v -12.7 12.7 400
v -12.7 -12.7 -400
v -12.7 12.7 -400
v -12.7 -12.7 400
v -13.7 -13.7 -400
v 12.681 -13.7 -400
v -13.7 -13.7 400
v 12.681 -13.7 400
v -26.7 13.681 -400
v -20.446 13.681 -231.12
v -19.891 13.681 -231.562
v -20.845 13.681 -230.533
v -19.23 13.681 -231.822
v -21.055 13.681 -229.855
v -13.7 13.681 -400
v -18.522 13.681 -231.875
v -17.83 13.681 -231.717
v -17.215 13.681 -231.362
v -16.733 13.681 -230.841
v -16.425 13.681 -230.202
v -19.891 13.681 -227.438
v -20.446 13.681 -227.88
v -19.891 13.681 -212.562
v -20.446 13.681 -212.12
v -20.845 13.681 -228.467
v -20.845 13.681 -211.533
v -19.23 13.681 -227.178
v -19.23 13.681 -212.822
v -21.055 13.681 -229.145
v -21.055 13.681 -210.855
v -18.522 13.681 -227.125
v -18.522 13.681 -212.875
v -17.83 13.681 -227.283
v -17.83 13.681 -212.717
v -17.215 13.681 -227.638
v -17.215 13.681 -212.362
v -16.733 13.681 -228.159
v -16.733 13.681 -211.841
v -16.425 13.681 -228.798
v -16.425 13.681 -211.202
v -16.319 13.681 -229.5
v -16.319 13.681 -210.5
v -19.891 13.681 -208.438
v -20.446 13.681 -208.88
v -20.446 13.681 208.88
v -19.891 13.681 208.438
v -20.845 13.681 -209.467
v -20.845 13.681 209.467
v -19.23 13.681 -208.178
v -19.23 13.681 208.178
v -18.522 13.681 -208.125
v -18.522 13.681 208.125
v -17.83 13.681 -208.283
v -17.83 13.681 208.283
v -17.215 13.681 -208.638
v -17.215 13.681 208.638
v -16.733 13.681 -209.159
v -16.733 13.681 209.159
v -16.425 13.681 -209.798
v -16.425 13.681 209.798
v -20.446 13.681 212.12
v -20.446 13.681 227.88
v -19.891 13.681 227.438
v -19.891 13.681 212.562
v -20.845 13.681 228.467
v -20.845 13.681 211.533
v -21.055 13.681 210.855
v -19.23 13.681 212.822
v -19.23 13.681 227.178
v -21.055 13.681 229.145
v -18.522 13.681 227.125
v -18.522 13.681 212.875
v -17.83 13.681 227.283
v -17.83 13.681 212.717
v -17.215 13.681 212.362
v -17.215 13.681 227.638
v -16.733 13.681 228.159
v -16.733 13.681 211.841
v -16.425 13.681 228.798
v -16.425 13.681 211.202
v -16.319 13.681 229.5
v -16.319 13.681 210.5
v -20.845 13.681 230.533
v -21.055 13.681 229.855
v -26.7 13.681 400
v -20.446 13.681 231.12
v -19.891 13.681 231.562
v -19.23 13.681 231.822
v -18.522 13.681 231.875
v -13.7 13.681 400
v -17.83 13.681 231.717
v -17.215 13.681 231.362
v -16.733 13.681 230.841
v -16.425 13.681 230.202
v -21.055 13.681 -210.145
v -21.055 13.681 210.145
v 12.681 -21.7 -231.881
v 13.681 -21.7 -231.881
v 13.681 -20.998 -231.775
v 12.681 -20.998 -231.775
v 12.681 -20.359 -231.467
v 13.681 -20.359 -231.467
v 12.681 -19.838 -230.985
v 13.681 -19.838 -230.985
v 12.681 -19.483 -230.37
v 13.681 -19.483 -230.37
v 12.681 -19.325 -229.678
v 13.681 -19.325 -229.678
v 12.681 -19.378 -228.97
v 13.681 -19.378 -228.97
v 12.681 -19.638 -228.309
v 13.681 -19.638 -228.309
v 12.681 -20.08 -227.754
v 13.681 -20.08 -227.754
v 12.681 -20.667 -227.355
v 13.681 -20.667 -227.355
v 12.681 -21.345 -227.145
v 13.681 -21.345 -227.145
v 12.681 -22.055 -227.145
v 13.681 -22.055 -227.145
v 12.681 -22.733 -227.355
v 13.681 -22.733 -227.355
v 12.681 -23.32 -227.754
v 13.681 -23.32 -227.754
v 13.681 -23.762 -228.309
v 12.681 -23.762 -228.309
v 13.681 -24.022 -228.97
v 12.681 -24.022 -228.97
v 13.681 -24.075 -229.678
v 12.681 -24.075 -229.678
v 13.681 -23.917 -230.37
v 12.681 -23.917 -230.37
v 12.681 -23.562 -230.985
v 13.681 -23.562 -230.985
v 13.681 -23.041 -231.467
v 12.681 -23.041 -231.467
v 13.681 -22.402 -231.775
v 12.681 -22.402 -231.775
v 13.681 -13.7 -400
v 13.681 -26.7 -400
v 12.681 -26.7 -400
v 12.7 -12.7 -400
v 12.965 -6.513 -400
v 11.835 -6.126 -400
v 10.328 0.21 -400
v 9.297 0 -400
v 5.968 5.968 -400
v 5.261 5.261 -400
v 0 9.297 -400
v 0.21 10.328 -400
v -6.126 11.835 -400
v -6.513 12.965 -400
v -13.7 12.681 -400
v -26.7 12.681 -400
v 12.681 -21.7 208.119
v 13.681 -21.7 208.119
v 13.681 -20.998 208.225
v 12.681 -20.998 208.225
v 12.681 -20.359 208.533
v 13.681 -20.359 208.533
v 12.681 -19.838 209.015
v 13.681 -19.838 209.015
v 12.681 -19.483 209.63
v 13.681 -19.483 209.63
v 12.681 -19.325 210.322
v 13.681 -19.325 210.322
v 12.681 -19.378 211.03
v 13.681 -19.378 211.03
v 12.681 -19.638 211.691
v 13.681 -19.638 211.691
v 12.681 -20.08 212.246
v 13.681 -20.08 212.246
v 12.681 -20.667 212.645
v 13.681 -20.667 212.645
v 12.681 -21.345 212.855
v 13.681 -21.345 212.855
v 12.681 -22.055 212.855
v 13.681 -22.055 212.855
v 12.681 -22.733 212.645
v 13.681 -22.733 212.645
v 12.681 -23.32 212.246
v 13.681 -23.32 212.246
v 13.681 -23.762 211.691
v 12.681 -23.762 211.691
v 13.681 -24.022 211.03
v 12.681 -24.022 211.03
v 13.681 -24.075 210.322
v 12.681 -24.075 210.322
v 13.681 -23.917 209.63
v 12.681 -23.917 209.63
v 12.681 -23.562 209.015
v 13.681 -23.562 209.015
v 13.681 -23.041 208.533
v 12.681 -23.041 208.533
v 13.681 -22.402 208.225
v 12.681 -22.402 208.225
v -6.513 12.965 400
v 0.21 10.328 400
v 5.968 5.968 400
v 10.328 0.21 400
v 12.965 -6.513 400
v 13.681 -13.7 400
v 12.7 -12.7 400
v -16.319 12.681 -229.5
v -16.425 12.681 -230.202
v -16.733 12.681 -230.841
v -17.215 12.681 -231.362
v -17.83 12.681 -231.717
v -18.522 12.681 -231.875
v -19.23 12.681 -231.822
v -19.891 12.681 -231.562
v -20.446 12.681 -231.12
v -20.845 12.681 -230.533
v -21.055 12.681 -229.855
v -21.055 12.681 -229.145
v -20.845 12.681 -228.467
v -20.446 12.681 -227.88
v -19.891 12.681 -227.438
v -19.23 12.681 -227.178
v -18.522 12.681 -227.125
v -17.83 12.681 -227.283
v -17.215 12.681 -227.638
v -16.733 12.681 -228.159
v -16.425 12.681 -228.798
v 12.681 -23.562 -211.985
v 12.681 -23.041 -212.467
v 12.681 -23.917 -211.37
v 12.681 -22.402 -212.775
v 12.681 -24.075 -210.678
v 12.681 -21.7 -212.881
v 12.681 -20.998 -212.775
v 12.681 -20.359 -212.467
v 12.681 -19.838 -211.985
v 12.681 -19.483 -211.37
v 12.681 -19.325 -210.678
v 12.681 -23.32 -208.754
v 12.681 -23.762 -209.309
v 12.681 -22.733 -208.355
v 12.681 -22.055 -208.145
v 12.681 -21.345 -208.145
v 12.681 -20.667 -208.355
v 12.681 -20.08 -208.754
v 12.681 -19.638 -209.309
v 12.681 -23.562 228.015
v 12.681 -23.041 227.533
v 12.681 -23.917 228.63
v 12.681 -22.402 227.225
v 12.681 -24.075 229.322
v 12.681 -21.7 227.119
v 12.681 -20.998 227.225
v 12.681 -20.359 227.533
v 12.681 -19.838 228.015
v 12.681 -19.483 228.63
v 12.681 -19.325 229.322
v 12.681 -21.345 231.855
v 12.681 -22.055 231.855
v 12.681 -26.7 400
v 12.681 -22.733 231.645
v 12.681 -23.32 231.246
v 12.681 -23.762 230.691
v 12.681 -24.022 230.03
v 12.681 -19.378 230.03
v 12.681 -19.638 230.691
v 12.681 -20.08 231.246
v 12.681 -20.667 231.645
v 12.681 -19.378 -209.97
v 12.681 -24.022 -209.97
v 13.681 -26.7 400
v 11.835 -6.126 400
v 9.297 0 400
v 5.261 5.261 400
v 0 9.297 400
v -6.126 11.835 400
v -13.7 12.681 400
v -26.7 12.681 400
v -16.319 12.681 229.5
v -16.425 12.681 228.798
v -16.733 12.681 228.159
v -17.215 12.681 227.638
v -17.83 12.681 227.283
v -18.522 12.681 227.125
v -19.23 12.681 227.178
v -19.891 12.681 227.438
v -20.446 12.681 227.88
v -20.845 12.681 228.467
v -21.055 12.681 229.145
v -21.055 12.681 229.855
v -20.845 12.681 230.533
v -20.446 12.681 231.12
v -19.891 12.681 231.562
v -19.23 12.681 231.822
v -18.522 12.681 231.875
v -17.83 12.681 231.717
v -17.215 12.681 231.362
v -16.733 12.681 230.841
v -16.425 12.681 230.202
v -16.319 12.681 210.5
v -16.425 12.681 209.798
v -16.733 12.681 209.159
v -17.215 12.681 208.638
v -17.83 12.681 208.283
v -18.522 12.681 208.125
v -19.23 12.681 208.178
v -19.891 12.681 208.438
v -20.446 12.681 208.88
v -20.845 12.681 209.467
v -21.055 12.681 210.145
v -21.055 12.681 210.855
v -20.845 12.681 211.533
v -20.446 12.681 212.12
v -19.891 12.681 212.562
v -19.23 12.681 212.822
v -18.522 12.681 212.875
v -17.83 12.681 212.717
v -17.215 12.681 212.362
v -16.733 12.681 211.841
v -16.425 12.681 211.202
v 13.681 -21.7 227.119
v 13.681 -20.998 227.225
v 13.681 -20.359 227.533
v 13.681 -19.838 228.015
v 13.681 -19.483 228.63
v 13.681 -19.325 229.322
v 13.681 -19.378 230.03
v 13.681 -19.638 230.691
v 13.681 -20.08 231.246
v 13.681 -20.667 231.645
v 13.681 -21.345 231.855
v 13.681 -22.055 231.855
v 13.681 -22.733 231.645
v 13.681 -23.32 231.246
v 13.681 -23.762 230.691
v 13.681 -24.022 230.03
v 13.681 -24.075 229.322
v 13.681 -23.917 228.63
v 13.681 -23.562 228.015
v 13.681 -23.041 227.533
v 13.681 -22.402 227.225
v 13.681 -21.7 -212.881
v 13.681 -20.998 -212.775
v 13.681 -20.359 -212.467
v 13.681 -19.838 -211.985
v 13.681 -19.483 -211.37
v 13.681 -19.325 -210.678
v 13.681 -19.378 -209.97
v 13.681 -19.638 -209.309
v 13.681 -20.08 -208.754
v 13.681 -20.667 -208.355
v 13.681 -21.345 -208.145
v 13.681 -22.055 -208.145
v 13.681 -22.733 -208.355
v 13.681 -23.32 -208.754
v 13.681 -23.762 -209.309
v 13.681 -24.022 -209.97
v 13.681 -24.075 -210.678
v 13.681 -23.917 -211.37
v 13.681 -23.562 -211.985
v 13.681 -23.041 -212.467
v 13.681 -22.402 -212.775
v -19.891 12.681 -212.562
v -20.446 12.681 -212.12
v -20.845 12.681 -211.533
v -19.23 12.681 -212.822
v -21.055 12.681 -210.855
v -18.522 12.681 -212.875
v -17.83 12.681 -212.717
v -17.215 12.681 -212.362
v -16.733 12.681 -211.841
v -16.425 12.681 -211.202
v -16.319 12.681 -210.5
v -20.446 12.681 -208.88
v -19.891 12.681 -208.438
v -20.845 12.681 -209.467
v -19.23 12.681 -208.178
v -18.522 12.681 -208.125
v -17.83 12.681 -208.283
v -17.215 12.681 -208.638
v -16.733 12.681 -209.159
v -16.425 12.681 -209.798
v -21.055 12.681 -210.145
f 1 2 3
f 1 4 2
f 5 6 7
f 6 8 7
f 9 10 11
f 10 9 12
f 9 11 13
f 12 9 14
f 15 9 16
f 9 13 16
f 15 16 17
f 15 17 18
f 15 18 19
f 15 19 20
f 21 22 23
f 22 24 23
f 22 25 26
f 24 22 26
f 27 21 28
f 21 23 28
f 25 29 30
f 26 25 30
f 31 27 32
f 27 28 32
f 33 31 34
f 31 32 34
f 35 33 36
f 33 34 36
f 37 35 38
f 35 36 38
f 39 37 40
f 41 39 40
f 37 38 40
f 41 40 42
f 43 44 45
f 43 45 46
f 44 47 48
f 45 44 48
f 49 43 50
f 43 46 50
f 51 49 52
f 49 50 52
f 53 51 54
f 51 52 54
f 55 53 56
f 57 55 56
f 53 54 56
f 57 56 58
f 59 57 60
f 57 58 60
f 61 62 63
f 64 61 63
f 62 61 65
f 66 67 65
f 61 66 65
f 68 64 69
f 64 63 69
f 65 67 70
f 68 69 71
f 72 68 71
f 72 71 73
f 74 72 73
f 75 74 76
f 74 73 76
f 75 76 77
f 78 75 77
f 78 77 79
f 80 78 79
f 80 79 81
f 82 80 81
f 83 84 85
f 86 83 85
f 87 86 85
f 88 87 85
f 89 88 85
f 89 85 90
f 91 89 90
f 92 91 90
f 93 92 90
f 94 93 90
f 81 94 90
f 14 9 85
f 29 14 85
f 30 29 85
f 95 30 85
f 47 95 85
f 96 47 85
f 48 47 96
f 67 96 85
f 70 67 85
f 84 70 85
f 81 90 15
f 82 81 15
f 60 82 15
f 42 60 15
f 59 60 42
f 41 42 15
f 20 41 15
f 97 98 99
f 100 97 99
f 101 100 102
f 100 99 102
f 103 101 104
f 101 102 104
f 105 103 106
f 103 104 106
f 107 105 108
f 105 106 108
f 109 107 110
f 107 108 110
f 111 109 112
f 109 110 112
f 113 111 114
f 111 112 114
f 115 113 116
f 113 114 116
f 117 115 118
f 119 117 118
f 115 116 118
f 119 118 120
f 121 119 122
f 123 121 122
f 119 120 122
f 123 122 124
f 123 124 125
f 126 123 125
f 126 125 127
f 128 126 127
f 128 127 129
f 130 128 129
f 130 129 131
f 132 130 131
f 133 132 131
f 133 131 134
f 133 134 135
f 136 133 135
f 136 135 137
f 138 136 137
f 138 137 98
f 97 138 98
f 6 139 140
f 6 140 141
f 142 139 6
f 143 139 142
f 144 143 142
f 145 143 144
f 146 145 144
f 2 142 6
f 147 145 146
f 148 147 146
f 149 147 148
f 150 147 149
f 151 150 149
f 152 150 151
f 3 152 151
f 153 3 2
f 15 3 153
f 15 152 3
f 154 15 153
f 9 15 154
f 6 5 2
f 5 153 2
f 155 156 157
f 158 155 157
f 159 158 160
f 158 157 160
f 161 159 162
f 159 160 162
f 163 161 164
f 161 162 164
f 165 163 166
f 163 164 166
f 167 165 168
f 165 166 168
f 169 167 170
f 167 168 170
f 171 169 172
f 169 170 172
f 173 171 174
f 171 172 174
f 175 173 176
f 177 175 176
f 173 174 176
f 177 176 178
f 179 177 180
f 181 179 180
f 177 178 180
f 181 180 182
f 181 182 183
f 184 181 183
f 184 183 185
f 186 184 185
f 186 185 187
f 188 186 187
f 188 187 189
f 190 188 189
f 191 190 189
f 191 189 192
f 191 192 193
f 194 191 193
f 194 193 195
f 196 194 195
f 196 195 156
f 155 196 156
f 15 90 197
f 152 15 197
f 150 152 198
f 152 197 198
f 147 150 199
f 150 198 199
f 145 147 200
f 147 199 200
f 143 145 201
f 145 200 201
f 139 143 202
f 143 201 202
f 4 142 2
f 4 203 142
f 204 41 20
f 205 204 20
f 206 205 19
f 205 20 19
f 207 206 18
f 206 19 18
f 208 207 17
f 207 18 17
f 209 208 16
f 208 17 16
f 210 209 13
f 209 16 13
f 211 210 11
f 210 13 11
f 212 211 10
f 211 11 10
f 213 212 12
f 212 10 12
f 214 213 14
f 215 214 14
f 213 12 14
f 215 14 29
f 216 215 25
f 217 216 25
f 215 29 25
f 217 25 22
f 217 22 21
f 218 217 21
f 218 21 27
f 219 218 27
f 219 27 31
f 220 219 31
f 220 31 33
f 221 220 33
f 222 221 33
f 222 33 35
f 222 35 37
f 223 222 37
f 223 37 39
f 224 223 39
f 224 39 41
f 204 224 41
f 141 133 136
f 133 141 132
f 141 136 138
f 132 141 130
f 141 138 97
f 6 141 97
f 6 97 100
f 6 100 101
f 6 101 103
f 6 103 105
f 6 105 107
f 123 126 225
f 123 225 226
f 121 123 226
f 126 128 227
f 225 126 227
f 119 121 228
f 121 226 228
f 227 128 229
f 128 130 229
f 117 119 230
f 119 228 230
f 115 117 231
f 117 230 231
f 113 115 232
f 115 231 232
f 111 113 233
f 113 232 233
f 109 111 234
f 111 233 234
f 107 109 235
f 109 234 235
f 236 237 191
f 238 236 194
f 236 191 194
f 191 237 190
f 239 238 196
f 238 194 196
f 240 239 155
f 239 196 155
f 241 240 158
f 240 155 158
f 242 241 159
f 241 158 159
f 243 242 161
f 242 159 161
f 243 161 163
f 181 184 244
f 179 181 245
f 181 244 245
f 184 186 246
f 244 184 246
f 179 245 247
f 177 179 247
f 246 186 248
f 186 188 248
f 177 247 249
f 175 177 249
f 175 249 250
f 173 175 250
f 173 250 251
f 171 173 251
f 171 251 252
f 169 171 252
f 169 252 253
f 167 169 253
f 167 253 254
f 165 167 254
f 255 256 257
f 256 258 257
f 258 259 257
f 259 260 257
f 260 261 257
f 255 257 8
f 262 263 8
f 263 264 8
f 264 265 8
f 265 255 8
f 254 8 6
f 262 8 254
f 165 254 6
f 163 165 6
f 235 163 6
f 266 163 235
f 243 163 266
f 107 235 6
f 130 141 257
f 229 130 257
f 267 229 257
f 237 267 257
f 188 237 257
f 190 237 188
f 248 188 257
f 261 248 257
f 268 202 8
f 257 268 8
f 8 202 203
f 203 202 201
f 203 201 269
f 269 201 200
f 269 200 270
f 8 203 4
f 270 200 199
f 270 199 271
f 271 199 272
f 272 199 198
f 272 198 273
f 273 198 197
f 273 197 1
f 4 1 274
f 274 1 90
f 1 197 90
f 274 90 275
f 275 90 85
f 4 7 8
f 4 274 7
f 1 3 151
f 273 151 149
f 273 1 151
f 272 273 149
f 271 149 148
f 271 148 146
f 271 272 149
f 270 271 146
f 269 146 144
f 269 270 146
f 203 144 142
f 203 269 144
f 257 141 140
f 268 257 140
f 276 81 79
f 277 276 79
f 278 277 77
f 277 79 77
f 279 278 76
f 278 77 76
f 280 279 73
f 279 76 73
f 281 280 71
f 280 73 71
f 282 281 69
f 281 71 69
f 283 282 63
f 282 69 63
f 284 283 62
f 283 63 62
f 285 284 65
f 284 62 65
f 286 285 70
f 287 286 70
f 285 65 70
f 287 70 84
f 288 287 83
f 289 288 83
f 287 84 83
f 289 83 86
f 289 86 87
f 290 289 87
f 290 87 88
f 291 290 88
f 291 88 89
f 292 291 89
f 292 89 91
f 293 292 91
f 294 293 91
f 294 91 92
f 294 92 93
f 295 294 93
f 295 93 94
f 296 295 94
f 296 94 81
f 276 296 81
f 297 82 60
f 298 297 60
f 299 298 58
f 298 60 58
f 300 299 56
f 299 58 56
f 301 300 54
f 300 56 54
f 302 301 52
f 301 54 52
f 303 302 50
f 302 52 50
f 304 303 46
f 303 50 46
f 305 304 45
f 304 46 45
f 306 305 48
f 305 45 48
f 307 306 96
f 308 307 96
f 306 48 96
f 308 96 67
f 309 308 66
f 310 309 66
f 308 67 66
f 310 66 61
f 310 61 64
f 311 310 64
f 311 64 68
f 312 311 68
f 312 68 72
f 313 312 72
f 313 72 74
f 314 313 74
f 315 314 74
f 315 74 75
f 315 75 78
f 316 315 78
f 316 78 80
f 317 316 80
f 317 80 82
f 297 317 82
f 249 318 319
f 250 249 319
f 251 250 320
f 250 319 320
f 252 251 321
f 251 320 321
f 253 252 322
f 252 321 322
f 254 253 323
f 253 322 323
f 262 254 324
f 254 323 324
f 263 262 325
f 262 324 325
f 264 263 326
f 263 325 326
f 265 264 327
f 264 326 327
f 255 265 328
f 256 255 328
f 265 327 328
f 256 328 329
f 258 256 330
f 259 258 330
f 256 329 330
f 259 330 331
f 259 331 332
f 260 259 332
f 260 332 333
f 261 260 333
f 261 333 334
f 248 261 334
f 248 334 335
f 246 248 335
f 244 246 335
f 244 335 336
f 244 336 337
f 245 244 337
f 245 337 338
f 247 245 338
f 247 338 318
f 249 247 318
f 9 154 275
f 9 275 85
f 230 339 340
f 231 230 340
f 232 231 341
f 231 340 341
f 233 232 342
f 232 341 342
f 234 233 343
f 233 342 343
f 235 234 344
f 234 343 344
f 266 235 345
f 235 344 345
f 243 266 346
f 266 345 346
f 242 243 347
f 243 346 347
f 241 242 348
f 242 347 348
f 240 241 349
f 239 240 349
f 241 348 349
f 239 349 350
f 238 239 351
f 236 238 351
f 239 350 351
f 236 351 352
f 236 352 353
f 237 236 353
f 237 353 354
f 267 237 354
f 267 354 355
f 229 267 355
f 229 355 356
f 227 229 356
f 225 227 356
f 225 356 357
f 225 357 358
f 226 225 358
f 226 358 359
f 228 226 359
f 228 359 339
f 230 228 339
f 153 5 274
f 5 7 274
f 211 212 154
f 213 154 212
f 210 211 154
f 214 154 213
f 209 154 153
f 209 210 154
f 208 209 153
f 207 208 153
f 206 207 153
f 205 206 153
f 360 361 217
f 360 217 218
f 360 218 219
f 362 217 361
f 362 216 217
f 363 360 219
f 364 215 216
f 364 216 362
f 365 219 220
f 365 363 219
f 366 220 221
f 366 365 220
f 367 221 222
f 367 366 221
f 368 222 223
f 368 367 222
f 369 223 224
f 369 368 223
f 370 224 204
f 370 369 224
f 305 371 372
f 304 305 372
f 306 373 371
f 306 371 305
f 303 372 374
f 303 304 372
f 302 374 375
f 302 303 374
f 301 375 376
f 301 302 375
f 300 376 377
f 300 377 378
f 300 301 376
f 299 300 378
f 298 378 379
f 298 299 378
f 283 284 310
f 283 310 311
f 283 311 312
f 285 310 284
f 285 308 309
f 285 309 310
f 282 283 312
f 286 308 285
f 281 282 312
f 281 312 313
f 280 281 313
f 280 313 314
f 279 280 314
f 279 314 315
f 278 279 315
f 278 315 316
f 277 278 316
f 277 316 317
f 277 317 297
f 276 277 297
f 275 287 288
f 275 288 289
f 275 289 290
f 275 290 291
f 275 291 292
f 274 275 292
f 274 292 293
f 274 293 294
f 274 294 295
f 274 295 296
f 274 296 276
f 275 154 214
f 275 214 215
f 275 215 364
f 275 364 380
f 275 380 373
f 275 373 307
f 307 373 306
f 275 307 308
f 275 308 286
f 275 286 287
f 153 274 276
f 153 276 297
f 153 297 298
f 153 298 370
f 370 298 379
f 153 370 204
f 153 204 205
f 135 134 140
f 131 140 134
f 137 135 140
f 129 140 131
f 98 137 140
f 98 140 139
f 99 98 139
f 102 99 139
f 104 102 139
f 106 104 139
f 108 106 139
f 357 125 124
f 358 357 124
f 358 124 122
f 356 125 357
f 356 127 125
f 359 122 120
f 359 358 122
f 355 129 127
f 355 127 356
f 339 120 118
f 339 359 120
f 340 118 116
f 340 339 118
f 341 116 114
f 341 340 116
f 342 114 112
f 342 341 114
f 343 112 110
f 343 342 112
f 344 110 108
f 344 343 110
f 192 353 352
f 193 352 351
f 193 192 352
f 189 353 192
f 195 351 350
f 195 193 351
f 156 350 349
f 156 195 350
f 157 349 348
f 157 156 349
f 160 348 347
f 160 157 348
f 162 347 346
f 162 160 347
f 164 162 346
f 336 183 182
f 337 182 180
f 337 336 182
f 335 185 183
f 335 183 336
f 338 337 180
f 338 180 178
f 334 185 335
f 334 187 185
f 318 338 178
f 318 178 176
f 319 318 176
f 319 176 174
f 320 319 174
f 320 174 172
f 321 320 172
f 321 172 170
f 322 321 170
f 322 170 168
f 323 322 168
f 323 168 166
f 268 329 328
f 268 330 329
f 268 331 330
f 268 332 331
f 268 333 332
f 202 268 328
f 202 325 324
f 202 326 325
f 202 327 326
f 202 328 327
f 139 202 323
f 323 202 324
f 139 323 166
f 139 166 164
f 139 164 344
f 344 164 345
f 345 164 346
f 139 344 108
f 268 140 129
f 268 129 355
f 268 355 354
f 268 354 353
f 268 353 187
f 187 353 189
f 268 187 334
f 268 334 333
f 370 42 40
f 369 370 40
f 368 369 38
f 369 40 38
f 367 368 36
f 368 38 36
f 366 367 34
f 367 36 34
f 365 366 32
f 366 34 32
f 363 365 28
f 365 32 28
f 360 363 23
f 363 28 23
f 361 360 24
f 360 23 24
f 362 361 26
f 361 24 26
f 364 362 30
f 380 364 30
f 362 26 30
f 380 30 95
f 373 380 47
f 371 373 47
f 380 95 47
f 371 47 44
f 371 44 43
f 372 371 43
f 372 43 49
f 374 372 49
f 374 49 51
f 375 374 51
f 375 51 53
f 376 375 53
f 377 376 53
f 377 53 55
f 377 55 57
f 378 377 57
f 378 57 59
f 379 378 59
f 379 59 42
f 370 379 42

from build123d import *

# Parameters (mm, degrees)
CROQUIS1_W              = 13
CROQUIS1_H              = 1
CROQUIS1_W_2            = 1
CROQUIS1_H_2            = 13
SALIENTE_EXTRUIR1_DEPTH = 400
CROQUIS2_R              = 2.38125
CORTAR_EXTRUIR1_DEPTH   = 10
CROQUIS3_R              = 2.38125
CORTAR_EXTRUIR2_DEPTH   = 10


with BuildPart() as part:
    # Croquis1 → Saliente-Extruir1 (new body, symmetric)
    with BuildSketch(Plane.XY):
        with BuildLine():
            ThreePointArc((-13.7, 13.681053808), (5.967619023, 5.967619023), (13.681053808, -13.7))
            Line((13.681053808, -13.7), (-13.7, -13.7))
            Line((-13.7, -13.7), (-13.7, 13.681053808))
        make_face()
        with BuildLine():
            Line((-12.7, -12.7), (-12.7, 12.7))
            ThreePointArc((-12.7, 12.7), (5.260512242, 5.260512242), (12.7, -12.7))
            Line((12.7, -12.7), (-12.7, -12.7))
        make_face(mode=Mode.SUBTRACT)
        with Locations((-20.2, 13.181053808)):
            Rectangle(CROQUIS1_W, CROQUIS1_H)
        with Locations((13.181053808, -20.2)):
            Rectangle(CROQUIS1_W_2, CROQUIS1_H_2)
    extrude(amount=SALIENTE_EXTRUIR1_DEPTH, both=True)

    # Croquis2 → Cortar-Extruir1 (cut)
    with BuildSketch(Plane(origin=(0, 13.681053808, 0), x_dir=(1, 0, 0), z_dir=(0, 1, 0))):
        with Locations((-18.7, -210.5)):
            Circle(CROQUIS2_R)
        with Locations((-18.7, -229.5)):
            Circle(CROQUIS2_R)
        with Locations((-18.7, 229.5)):
            Circle(CROQUIS2_R)
        with Locations((-18.7, 210.5)):
            Circle(CROQUIS2_R)
    extrude(amount=-CORTAR_EXTRUIR1_DEPTH, mode=Mode.SUBTRACT)

    # Croquis3 → Cortar-Extruir2 (cut)
    with BuildSketch(Plane(origin=(13.681053808, 0, 0), x_dir=(0, 0, -1), z_dir=(1, 0, 0))):
        with Locations((-229.5, -21.7)):
            Circle(CROQUIS3_R)
        with Locations((-210.5, -21.7)):
            Circle(CROQUIS3_R)
        with Locations((210.5, -21.7)):
            Circle(CROQUIS3_R)
        with Locations((229.5, -21.7)):
            Circle(CROQUIS3_R)
    extrude(amount=-CORTAR_EXTRUIR2_DEPTH, mode=Mode.SUBTRACT)


solid = part.part
